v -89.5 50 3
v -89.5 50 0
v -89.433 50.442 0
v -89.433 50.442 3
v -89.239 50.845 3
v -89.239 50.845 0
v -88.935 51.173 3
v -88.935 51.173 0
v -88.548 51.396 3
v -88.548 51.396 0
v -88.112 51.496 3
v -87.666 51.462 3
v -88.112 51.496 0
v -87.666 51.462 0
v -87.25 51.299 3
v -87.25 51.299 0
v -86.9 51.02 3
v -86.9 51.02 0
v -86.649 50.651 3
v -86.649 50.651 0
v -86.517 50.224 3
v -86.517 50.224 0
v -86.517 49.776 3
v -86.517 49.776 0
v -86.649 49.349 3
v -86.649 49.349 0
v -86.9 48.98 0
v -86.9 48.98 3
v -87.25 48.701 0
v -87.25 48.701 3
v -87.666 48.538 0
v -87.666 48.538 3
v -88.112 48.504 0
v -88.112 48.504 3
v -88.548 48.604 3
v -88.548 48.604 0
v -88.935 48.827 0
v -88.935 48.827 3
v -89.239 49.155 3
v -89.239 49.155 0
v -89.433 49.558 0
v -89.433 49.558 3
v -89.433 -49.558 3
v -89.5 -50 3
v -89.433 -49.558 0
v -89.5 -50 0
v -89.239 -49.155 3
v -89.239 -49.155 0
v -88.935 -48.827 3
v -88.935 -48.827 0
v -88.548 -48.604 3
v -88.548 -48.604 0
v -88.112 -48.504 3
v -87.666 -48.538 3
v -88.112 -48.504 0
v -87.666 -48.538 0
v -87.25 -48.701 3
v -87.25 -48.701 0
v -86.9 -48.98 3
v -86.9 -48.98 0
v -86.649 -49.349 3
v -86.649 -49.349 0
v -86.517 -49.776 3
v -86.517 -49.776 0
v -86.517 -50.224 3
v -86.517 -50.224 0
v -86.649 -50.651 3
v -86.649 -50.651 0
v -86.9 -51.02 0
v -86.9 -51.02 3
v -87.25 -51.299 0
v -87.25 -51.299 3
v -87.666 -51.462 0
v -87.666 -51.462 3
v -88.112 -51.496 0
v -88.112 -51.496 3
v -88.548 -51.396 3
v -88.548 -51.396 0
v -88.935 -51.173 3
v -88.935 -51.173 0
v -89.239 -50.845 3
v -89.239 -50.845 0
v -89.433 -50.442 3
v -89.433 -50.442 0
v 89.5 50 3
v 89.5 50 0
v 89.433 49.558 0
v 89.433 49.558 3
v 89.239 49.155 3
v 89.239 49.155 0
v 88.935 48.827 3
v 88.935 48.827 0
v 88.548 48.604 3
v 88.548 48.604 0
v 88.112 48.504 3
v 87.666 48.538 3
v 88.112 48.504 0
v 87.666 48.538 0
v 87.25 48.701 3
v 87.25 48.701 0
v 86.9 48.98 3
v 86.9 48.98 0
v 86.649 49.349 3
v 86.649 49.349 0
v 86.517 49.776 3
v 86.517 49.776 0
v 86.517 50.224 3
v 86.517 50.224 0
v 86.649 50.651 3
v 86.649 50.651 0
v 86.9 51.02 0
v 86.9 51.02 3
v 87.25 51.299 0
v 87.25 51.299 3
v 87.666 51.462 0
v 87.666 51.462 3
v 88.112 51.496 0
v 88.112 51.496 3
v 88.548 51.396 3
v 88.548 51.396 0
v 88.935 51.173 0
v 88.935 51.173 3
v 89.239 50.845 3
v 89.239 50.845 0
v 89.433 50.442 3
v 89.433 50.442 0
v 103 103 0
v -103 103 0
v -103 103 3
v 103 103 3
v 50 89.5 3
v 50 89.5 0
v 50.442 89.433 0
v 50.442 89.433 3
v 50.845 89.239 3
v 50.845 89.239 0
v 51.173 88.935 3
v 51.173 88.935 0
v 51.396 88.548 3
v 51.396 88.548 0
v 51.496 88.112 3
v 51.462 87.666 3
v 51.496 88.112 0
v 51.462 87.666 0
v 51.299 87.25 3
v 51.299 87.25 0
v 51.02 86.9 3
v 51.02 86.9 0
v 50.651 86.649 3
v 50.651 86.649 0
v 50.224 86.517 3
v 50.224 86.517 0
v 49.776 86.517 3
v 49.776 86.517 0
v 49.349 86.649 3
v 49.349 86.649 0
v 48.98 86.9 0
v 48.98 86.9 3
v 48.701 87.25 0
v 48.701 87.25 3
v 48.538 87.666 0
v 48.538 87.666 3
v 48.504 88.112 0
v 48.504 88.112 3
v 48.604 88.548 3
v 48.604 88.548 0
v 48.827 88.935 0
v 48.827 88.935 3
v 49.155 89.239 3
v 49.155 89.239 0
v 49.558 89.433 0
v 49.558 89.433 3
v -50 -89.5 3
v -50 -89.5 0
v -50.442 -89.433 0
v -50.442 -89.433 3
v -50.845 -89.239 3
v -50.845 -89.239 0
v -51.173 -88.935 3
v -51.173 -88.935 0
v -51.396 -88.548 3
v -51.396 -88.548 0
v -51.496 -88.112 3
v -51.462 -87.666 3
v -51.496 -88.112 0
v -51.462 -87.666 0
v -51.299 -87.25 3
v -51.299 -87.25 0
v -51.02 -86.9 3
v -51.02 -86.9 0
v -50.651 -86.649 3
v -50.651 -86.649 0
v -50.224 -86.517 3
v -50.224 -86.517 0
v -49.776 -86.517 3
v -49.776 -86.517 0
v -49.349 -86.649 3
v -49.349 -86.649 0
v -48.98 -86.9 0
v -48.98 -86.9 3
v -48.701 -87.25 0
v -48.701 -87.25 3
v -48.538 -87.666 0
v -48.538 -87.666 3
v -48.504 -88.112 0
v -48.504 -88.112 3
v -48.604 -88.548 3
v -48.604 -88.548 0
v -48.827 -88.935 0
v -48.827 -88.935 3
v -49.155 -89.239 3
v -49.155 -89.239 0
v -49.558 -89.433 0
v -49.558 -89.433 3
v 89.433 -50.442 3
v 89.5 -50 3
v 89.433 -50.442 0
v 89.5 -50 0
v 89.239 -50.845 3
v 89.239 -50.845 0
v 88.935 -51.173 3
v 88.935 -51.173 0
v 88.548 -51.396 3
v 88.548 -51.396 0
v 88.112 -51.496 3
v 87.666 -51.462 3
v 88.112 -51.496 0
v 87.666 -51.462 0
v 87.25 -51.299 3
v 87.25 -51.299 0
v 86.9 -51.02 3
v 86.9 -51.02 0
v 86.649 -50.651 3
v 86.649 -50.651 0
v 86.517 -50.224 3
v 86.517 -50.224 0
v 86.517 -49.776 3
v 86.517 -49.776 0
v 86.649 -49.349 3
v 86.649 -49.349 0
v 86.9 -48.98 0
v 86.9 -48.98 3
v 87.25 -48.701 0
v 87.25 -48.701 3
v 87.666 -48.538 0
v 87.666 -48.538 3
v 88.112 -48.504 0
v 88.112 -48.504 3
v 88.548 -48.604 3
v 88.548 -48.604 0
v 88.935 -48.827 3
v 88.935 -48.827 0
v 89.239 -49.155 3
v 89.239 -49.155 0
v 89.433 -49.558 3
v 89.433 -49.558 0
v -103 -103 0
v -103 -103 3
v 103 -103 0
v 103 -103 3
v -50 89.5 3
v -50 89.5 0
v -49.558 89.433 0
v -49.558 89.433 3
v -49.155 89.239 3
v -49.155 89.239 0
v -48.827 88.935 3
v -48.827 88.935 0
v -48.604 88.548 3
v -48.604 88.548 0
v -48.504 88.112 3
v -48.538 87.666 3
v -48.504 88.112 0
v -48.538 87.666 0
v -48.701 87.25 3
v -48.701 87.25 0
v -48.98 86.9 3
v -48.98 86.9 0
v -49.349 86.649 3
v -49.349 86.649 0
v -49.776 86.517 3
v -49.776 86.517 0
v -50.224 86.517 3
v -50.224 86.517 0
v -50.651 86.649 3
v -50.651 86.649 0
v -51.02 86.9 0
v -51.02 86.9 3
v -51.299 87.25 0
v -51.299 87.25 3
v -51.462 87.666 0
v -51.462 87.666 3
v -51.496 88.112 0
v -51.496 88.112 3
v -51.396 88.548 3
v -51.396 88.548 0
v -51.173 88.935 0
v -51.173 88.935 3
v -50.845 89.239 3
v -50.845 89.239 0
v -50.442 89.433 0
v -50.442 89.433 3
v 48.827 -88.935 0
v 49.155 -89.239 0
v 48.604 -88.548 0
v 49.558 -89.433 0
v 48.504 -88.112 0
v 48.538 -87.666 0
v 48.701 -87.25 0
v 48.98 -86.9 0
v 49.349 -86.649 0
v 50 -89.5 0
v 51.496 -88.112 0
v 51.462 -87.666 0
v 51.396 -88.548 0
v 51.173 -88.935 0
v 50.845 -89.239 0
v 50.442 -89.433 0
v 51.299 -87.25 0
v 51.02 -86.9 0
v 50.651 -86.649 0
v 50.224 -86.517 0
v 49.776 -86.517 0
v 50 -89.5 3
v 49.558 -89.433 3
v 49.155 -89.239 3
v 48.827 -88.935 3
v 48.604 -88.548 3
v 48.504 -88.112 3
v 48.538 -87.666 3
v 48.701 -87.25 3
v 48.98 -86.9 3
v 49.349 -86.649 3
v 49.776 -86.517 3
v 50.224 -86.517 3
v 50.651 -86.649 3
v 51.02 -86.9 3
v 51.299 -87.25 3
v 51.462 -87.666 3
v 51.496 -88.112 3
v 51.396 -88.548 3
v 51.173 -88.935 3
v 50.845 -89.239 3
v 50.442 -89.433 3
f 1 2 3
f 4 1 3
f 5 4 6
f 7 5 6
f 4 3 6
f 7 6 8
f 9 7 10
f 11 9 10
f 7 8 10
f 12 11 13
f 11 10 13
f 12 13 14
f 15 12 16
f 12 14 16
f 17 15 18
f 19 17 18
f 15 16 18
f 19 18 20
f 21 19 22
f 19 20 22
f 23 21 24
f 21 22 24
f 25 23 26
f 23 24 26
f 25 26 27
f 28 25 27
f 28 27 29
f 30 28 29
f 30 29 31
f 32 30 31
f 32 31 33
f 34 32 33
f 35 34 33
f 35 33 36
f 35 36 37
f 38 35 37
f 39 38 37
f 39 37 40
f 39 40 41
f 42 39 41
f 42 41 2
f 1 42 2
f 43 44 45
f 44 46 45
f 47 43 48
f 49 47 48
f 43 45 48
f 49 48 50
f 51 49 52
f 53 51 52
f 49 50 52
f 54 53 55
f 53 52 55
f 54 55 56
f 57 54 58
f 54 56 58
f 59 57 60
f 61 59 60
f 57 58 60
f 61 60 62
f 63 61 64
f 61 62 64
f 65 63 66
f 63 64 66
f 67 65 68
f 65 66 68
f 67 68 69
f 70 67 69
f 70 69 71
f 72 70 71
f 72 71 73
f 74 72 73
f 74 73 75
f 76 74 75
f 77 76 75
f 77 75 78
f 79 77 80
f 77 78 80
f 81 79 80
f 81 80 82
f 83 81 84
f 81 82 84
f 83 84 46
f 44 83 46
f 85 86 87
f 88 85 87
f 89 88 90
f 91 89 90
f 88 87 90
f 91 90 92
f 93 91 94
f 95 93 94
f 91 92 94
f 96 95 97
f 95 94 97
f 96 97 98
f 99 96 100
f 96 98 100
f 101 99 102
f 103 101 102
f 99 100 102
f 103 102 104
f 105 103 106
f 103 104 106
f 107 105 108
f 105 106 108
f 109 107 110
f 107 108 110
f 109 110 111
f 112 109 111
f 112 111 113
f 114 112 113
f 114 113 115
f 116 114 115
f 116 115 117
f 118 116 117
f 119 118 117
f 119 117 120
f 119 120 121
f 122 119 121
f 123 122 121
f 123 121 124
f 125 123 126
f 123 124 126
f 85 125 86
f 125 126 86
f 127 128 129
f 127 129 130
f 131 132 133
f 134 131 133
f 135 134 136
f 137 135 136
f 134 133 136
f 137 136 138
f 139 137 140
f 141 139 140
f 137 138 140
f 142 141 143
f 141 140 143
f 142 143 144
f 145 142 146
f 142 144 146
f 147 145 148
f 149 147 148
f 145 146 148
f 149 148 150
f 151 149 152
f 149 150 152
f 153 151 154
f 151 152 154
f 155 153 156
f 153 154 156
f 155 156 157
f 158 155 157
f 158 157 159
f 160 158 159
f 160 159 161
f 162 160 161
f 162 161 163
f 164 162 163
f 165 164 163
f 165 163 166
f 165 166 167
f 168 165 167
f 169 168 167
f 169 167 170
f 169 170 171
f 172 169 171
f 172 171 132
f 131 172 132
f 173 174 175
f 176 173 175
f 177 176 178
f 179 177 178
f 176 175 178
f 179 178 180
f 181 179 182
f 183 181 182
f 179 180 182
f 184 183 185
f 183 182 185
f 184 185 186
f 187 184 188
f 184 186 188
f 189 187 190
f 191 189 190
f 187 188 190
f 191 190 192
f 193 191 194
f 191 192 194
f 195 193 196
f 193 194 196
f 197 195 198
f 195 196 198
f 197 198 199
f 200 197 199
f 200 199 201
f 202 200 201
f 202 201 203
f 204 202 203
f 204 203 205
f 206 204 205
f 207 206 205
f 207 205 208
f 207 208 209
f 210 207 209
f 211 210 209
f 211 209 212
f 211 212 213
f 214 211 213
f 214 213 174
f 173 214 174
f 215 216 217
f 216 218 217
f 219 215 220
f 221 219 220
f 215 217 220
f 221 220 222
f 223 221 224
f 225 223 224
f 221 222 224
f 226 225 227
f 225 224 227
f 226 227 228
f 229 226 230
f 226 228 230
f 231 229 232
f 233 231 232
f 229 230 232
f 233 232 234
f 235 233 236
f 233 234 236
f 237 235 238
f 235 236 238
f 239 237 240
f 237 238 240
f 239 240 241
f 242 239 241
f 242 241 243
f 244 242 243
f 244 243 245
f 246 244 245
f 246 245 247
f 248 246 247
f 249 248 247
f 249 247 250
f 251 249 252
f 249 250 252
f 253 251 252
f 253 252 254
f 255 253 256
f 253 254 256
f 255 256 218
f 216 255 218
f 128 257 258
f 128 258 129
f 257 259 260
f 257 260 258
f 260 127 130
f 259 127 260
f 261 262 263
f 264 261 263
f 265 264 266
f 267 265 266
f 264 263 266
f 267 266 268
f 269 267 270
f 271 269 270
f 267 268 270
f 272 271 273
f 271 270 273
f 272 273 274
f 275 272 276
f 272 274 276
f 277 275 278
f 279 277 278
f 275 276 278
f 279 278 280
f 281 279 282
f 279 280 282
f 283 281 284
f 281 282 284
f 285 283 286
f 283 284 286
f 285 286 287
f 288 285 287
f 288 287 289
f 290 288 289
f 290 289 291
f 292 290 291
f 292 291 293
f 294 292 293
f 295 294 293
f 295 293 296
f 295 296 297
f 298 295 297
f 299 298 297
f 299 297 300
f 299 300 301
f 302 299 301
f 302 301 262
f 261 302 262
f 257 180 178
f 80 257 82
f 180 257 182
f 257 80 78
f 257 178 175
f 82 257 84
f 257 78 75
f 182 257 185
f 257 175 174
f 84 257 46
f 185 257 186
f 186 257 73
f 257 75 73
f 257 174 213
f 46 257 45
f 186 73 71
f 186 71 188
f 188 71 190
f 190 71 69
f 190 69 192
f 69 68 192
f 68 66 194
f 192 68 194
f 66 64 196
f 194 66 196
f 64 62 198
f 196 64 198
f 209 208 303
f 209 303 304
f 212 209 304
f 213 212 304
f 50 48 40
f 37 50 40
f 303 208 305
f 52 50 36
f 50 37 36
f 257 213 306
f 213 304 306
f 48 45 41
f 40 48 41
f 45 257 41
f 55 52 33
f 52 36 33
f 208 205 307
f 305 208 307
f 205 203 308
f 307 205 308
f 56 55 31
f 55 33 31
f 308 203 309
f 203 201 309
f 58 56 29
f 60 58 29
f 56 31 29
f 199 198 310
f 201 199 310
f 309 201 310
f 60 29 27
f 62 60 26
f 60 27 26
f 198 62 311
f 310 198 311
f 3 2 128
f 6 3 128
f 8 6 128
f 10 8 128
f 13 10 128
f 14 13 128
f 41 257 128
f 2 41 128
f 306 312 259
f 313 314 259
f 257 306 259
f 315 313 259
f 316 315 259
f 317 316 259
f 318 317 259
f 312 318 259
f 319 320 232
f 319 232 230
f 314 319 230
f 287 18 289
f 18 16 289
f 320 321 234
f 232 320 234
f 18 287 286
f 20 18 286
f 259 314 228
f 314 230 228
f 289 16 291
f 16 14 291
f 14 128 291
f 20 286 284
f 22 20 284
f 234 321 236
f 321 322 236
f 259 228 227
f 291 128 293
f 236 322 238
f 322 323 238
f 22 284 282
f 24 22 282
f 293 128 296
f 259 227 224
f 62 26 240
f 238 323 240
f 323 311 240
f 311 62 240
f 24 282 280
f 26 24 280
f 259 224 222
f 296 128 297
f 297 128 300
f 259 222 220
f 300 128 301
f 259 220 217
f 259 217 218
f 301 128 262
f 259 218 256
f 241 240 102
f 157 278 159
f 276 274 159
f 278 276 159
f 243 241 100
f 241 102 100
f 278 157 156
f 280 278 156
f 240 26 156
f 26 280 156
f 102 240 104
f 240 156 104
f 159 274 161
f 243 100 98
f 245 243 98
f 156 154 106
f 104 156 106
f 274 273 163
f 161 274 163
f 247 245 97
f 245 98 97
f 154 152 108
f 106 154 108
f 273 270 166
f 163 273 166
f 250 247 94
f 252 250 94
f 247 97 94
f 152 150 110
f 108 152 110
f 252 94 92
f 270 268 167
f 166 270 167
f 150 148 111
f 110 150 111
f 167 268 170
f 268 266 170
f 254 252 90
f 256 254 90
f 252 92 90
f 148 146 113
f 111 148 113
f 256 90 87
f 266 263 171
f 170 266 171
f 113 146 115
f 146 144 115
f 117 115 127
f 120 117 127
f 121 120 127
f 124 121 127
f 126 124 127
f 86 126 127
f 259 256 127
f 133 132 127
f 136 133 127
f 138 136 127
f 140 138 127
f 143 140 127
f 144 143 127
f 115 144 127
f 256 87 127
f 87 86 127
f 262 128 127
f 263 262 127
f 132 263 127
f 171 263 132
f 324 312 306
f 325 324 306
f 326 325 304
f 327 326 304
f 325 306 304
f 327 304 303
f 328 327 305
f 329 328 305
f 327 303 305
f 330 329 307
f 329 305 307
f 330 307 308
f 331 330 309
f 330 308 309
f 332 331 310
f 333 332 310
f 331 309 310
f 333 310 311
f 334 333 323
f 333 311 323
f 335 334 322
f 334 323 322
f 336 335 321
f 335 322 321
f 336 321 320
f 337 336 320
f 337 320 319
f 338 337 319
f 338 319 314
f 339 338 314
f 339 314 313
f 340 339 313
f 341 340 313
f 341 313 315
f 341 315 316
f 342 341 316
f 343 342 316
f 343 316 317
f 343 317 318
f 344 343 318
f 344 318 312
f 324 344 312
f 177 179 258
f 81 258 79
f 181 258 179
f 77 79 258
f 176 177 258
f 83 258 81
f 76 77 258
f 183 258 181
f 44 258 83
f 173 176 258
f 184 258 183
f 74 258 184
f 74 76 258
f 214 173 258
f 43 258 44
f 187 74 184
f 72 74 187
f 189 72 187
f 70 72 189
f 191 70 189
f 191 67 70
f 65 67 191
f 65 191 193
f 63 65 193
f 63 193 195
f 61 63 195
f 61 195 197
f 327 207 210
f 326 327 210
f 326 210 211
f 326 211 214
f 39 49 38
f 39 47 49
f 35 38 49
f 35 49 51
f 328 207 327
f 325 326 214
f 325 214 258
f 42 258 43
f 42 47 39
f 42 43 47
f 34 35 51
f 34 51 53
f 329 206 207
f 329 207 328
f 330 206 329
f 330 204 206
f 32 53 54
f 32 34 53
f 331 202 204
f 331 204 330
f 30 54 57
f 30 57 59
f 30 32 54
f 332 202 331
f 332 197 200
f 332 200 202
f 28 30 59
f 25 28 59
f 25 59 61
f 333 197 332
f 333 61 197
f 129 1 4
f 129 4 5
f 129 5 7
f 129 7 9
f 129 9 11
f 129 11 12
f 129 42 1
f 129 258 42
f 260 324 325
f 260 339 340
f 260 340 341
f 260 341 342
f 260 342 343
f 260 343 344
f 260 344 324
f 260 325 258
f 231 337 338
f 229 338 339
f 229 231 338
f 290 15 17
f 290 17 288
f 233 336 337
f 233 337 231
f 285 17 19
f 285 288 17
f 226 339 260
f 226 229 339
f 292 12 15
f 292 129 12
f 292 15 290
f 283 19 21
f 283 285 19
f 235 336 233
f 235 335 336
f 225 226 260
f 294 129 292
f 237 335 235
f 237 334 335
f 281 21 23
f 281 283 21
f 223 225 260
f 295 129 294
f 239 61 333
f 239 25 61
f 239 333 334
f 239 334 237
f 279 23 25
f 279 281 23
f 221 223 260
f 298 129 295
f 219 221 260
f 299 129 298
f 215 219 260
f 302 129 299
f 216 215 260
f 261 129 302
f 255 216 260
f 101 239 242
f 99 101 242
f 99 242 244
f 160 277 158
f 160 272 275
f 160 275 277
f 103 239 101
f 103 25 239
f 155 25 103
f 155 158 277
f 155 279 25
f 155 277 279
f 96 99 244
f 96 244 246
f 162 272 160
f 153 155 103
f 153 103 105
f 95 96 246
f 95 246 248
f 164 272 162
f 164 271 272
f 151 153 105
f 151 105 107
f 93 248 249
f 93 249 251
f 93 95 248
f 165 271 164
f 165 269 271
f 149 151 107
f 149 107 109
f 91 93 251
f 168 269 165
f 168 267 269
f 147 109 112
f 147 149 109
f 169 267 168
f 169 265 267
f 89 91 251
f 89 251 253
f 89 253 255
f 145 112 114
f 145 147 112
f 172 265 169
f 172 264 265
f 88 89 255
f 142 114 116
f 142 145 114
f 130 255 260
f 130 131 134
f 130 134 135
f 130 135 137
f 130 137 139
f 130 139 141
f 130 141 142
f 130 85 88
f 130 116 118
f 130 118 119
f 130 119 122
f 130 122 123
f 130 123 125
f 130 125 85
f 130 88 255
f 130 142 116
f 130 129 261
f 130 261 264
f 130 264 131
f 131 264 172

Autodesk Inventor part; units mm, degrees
ref_plane "YZ Plane" through (0, 0, 0) normal (1, 0, 0) x (0, 1, 0)
ref_plane "XZ Plane" through (0, 0, 0) normal (0, 1, 0) x (-1, 0, 0)
ref_plane "XY Plane" through (0, 0, 0) normal (0, 0, 1) x (1, 0, 0)
sketch "Boceto1" plane through (0, 0, 0) normal (0, 0, 1) x (1, 0, 0)
  line L0 (-103, -100) -> (-103, 103) projected
  line L1 (-100, 103) -> (-100, -100) projected
  line L2 (-103, 103) -> (-100, 103) projected
  line L3 (-100, 103) -> (103, 103) projected
  line L4 (103, 103) -> (103, 100) projected
  line L5 (103, 103) -> (-103, 103)
  line L6 (-103, 103) -> (-103, -100)
  line L7 (-103, -100) -> (103, -100)
  line L8 (103, -100) -> (103, 103)
  line L9 (103, -103) -> (-103, -103)
  line L10 (-103, -103) -> (-103, 103)
  line L11 (-103, 103) -> (103, 103)
  line L12 (103, 103) -> (103, -103)
  line L13 (-103, -100) -> (-100, -100) projected
  point P0 (0, 0)
extrude "Extrusión1" add sketch "Boceto1" along normal blind 3
sketch "Boceto2" plane through (0, 0, 3) normal (0, 0, 1) x (1, 0, 0)
  line L0 (51.75, -100) -> (48.25, -100) projected
  line L1 (-48.25, -100) -> (-51.75, -100) projected
  line L2 (50, -100) -> (50, -88)
  line L3 (-50, -100) -> (-50, -88)
  circle A0 centre (50, -88) radius 1.5
  circle A1 centre (-50, -88) radius 1.5
  point P0 (0, 0)
  dimension "d2" = 12
  dimension "d3" = 12
  dimension "d5" = 3
  dimension "d6" = 3
hole "Agujero1" at (50, -88, 3) at (-50, -88, 3) direction (0, 0, -1) diameter 3 depth 7
pattern_circular "Patrón circular1" count 4 over 360 about axis through (0, 0, -10) along (0, 0, 1) of "Agujero1"
properties part number "Tapa_Inferior"
